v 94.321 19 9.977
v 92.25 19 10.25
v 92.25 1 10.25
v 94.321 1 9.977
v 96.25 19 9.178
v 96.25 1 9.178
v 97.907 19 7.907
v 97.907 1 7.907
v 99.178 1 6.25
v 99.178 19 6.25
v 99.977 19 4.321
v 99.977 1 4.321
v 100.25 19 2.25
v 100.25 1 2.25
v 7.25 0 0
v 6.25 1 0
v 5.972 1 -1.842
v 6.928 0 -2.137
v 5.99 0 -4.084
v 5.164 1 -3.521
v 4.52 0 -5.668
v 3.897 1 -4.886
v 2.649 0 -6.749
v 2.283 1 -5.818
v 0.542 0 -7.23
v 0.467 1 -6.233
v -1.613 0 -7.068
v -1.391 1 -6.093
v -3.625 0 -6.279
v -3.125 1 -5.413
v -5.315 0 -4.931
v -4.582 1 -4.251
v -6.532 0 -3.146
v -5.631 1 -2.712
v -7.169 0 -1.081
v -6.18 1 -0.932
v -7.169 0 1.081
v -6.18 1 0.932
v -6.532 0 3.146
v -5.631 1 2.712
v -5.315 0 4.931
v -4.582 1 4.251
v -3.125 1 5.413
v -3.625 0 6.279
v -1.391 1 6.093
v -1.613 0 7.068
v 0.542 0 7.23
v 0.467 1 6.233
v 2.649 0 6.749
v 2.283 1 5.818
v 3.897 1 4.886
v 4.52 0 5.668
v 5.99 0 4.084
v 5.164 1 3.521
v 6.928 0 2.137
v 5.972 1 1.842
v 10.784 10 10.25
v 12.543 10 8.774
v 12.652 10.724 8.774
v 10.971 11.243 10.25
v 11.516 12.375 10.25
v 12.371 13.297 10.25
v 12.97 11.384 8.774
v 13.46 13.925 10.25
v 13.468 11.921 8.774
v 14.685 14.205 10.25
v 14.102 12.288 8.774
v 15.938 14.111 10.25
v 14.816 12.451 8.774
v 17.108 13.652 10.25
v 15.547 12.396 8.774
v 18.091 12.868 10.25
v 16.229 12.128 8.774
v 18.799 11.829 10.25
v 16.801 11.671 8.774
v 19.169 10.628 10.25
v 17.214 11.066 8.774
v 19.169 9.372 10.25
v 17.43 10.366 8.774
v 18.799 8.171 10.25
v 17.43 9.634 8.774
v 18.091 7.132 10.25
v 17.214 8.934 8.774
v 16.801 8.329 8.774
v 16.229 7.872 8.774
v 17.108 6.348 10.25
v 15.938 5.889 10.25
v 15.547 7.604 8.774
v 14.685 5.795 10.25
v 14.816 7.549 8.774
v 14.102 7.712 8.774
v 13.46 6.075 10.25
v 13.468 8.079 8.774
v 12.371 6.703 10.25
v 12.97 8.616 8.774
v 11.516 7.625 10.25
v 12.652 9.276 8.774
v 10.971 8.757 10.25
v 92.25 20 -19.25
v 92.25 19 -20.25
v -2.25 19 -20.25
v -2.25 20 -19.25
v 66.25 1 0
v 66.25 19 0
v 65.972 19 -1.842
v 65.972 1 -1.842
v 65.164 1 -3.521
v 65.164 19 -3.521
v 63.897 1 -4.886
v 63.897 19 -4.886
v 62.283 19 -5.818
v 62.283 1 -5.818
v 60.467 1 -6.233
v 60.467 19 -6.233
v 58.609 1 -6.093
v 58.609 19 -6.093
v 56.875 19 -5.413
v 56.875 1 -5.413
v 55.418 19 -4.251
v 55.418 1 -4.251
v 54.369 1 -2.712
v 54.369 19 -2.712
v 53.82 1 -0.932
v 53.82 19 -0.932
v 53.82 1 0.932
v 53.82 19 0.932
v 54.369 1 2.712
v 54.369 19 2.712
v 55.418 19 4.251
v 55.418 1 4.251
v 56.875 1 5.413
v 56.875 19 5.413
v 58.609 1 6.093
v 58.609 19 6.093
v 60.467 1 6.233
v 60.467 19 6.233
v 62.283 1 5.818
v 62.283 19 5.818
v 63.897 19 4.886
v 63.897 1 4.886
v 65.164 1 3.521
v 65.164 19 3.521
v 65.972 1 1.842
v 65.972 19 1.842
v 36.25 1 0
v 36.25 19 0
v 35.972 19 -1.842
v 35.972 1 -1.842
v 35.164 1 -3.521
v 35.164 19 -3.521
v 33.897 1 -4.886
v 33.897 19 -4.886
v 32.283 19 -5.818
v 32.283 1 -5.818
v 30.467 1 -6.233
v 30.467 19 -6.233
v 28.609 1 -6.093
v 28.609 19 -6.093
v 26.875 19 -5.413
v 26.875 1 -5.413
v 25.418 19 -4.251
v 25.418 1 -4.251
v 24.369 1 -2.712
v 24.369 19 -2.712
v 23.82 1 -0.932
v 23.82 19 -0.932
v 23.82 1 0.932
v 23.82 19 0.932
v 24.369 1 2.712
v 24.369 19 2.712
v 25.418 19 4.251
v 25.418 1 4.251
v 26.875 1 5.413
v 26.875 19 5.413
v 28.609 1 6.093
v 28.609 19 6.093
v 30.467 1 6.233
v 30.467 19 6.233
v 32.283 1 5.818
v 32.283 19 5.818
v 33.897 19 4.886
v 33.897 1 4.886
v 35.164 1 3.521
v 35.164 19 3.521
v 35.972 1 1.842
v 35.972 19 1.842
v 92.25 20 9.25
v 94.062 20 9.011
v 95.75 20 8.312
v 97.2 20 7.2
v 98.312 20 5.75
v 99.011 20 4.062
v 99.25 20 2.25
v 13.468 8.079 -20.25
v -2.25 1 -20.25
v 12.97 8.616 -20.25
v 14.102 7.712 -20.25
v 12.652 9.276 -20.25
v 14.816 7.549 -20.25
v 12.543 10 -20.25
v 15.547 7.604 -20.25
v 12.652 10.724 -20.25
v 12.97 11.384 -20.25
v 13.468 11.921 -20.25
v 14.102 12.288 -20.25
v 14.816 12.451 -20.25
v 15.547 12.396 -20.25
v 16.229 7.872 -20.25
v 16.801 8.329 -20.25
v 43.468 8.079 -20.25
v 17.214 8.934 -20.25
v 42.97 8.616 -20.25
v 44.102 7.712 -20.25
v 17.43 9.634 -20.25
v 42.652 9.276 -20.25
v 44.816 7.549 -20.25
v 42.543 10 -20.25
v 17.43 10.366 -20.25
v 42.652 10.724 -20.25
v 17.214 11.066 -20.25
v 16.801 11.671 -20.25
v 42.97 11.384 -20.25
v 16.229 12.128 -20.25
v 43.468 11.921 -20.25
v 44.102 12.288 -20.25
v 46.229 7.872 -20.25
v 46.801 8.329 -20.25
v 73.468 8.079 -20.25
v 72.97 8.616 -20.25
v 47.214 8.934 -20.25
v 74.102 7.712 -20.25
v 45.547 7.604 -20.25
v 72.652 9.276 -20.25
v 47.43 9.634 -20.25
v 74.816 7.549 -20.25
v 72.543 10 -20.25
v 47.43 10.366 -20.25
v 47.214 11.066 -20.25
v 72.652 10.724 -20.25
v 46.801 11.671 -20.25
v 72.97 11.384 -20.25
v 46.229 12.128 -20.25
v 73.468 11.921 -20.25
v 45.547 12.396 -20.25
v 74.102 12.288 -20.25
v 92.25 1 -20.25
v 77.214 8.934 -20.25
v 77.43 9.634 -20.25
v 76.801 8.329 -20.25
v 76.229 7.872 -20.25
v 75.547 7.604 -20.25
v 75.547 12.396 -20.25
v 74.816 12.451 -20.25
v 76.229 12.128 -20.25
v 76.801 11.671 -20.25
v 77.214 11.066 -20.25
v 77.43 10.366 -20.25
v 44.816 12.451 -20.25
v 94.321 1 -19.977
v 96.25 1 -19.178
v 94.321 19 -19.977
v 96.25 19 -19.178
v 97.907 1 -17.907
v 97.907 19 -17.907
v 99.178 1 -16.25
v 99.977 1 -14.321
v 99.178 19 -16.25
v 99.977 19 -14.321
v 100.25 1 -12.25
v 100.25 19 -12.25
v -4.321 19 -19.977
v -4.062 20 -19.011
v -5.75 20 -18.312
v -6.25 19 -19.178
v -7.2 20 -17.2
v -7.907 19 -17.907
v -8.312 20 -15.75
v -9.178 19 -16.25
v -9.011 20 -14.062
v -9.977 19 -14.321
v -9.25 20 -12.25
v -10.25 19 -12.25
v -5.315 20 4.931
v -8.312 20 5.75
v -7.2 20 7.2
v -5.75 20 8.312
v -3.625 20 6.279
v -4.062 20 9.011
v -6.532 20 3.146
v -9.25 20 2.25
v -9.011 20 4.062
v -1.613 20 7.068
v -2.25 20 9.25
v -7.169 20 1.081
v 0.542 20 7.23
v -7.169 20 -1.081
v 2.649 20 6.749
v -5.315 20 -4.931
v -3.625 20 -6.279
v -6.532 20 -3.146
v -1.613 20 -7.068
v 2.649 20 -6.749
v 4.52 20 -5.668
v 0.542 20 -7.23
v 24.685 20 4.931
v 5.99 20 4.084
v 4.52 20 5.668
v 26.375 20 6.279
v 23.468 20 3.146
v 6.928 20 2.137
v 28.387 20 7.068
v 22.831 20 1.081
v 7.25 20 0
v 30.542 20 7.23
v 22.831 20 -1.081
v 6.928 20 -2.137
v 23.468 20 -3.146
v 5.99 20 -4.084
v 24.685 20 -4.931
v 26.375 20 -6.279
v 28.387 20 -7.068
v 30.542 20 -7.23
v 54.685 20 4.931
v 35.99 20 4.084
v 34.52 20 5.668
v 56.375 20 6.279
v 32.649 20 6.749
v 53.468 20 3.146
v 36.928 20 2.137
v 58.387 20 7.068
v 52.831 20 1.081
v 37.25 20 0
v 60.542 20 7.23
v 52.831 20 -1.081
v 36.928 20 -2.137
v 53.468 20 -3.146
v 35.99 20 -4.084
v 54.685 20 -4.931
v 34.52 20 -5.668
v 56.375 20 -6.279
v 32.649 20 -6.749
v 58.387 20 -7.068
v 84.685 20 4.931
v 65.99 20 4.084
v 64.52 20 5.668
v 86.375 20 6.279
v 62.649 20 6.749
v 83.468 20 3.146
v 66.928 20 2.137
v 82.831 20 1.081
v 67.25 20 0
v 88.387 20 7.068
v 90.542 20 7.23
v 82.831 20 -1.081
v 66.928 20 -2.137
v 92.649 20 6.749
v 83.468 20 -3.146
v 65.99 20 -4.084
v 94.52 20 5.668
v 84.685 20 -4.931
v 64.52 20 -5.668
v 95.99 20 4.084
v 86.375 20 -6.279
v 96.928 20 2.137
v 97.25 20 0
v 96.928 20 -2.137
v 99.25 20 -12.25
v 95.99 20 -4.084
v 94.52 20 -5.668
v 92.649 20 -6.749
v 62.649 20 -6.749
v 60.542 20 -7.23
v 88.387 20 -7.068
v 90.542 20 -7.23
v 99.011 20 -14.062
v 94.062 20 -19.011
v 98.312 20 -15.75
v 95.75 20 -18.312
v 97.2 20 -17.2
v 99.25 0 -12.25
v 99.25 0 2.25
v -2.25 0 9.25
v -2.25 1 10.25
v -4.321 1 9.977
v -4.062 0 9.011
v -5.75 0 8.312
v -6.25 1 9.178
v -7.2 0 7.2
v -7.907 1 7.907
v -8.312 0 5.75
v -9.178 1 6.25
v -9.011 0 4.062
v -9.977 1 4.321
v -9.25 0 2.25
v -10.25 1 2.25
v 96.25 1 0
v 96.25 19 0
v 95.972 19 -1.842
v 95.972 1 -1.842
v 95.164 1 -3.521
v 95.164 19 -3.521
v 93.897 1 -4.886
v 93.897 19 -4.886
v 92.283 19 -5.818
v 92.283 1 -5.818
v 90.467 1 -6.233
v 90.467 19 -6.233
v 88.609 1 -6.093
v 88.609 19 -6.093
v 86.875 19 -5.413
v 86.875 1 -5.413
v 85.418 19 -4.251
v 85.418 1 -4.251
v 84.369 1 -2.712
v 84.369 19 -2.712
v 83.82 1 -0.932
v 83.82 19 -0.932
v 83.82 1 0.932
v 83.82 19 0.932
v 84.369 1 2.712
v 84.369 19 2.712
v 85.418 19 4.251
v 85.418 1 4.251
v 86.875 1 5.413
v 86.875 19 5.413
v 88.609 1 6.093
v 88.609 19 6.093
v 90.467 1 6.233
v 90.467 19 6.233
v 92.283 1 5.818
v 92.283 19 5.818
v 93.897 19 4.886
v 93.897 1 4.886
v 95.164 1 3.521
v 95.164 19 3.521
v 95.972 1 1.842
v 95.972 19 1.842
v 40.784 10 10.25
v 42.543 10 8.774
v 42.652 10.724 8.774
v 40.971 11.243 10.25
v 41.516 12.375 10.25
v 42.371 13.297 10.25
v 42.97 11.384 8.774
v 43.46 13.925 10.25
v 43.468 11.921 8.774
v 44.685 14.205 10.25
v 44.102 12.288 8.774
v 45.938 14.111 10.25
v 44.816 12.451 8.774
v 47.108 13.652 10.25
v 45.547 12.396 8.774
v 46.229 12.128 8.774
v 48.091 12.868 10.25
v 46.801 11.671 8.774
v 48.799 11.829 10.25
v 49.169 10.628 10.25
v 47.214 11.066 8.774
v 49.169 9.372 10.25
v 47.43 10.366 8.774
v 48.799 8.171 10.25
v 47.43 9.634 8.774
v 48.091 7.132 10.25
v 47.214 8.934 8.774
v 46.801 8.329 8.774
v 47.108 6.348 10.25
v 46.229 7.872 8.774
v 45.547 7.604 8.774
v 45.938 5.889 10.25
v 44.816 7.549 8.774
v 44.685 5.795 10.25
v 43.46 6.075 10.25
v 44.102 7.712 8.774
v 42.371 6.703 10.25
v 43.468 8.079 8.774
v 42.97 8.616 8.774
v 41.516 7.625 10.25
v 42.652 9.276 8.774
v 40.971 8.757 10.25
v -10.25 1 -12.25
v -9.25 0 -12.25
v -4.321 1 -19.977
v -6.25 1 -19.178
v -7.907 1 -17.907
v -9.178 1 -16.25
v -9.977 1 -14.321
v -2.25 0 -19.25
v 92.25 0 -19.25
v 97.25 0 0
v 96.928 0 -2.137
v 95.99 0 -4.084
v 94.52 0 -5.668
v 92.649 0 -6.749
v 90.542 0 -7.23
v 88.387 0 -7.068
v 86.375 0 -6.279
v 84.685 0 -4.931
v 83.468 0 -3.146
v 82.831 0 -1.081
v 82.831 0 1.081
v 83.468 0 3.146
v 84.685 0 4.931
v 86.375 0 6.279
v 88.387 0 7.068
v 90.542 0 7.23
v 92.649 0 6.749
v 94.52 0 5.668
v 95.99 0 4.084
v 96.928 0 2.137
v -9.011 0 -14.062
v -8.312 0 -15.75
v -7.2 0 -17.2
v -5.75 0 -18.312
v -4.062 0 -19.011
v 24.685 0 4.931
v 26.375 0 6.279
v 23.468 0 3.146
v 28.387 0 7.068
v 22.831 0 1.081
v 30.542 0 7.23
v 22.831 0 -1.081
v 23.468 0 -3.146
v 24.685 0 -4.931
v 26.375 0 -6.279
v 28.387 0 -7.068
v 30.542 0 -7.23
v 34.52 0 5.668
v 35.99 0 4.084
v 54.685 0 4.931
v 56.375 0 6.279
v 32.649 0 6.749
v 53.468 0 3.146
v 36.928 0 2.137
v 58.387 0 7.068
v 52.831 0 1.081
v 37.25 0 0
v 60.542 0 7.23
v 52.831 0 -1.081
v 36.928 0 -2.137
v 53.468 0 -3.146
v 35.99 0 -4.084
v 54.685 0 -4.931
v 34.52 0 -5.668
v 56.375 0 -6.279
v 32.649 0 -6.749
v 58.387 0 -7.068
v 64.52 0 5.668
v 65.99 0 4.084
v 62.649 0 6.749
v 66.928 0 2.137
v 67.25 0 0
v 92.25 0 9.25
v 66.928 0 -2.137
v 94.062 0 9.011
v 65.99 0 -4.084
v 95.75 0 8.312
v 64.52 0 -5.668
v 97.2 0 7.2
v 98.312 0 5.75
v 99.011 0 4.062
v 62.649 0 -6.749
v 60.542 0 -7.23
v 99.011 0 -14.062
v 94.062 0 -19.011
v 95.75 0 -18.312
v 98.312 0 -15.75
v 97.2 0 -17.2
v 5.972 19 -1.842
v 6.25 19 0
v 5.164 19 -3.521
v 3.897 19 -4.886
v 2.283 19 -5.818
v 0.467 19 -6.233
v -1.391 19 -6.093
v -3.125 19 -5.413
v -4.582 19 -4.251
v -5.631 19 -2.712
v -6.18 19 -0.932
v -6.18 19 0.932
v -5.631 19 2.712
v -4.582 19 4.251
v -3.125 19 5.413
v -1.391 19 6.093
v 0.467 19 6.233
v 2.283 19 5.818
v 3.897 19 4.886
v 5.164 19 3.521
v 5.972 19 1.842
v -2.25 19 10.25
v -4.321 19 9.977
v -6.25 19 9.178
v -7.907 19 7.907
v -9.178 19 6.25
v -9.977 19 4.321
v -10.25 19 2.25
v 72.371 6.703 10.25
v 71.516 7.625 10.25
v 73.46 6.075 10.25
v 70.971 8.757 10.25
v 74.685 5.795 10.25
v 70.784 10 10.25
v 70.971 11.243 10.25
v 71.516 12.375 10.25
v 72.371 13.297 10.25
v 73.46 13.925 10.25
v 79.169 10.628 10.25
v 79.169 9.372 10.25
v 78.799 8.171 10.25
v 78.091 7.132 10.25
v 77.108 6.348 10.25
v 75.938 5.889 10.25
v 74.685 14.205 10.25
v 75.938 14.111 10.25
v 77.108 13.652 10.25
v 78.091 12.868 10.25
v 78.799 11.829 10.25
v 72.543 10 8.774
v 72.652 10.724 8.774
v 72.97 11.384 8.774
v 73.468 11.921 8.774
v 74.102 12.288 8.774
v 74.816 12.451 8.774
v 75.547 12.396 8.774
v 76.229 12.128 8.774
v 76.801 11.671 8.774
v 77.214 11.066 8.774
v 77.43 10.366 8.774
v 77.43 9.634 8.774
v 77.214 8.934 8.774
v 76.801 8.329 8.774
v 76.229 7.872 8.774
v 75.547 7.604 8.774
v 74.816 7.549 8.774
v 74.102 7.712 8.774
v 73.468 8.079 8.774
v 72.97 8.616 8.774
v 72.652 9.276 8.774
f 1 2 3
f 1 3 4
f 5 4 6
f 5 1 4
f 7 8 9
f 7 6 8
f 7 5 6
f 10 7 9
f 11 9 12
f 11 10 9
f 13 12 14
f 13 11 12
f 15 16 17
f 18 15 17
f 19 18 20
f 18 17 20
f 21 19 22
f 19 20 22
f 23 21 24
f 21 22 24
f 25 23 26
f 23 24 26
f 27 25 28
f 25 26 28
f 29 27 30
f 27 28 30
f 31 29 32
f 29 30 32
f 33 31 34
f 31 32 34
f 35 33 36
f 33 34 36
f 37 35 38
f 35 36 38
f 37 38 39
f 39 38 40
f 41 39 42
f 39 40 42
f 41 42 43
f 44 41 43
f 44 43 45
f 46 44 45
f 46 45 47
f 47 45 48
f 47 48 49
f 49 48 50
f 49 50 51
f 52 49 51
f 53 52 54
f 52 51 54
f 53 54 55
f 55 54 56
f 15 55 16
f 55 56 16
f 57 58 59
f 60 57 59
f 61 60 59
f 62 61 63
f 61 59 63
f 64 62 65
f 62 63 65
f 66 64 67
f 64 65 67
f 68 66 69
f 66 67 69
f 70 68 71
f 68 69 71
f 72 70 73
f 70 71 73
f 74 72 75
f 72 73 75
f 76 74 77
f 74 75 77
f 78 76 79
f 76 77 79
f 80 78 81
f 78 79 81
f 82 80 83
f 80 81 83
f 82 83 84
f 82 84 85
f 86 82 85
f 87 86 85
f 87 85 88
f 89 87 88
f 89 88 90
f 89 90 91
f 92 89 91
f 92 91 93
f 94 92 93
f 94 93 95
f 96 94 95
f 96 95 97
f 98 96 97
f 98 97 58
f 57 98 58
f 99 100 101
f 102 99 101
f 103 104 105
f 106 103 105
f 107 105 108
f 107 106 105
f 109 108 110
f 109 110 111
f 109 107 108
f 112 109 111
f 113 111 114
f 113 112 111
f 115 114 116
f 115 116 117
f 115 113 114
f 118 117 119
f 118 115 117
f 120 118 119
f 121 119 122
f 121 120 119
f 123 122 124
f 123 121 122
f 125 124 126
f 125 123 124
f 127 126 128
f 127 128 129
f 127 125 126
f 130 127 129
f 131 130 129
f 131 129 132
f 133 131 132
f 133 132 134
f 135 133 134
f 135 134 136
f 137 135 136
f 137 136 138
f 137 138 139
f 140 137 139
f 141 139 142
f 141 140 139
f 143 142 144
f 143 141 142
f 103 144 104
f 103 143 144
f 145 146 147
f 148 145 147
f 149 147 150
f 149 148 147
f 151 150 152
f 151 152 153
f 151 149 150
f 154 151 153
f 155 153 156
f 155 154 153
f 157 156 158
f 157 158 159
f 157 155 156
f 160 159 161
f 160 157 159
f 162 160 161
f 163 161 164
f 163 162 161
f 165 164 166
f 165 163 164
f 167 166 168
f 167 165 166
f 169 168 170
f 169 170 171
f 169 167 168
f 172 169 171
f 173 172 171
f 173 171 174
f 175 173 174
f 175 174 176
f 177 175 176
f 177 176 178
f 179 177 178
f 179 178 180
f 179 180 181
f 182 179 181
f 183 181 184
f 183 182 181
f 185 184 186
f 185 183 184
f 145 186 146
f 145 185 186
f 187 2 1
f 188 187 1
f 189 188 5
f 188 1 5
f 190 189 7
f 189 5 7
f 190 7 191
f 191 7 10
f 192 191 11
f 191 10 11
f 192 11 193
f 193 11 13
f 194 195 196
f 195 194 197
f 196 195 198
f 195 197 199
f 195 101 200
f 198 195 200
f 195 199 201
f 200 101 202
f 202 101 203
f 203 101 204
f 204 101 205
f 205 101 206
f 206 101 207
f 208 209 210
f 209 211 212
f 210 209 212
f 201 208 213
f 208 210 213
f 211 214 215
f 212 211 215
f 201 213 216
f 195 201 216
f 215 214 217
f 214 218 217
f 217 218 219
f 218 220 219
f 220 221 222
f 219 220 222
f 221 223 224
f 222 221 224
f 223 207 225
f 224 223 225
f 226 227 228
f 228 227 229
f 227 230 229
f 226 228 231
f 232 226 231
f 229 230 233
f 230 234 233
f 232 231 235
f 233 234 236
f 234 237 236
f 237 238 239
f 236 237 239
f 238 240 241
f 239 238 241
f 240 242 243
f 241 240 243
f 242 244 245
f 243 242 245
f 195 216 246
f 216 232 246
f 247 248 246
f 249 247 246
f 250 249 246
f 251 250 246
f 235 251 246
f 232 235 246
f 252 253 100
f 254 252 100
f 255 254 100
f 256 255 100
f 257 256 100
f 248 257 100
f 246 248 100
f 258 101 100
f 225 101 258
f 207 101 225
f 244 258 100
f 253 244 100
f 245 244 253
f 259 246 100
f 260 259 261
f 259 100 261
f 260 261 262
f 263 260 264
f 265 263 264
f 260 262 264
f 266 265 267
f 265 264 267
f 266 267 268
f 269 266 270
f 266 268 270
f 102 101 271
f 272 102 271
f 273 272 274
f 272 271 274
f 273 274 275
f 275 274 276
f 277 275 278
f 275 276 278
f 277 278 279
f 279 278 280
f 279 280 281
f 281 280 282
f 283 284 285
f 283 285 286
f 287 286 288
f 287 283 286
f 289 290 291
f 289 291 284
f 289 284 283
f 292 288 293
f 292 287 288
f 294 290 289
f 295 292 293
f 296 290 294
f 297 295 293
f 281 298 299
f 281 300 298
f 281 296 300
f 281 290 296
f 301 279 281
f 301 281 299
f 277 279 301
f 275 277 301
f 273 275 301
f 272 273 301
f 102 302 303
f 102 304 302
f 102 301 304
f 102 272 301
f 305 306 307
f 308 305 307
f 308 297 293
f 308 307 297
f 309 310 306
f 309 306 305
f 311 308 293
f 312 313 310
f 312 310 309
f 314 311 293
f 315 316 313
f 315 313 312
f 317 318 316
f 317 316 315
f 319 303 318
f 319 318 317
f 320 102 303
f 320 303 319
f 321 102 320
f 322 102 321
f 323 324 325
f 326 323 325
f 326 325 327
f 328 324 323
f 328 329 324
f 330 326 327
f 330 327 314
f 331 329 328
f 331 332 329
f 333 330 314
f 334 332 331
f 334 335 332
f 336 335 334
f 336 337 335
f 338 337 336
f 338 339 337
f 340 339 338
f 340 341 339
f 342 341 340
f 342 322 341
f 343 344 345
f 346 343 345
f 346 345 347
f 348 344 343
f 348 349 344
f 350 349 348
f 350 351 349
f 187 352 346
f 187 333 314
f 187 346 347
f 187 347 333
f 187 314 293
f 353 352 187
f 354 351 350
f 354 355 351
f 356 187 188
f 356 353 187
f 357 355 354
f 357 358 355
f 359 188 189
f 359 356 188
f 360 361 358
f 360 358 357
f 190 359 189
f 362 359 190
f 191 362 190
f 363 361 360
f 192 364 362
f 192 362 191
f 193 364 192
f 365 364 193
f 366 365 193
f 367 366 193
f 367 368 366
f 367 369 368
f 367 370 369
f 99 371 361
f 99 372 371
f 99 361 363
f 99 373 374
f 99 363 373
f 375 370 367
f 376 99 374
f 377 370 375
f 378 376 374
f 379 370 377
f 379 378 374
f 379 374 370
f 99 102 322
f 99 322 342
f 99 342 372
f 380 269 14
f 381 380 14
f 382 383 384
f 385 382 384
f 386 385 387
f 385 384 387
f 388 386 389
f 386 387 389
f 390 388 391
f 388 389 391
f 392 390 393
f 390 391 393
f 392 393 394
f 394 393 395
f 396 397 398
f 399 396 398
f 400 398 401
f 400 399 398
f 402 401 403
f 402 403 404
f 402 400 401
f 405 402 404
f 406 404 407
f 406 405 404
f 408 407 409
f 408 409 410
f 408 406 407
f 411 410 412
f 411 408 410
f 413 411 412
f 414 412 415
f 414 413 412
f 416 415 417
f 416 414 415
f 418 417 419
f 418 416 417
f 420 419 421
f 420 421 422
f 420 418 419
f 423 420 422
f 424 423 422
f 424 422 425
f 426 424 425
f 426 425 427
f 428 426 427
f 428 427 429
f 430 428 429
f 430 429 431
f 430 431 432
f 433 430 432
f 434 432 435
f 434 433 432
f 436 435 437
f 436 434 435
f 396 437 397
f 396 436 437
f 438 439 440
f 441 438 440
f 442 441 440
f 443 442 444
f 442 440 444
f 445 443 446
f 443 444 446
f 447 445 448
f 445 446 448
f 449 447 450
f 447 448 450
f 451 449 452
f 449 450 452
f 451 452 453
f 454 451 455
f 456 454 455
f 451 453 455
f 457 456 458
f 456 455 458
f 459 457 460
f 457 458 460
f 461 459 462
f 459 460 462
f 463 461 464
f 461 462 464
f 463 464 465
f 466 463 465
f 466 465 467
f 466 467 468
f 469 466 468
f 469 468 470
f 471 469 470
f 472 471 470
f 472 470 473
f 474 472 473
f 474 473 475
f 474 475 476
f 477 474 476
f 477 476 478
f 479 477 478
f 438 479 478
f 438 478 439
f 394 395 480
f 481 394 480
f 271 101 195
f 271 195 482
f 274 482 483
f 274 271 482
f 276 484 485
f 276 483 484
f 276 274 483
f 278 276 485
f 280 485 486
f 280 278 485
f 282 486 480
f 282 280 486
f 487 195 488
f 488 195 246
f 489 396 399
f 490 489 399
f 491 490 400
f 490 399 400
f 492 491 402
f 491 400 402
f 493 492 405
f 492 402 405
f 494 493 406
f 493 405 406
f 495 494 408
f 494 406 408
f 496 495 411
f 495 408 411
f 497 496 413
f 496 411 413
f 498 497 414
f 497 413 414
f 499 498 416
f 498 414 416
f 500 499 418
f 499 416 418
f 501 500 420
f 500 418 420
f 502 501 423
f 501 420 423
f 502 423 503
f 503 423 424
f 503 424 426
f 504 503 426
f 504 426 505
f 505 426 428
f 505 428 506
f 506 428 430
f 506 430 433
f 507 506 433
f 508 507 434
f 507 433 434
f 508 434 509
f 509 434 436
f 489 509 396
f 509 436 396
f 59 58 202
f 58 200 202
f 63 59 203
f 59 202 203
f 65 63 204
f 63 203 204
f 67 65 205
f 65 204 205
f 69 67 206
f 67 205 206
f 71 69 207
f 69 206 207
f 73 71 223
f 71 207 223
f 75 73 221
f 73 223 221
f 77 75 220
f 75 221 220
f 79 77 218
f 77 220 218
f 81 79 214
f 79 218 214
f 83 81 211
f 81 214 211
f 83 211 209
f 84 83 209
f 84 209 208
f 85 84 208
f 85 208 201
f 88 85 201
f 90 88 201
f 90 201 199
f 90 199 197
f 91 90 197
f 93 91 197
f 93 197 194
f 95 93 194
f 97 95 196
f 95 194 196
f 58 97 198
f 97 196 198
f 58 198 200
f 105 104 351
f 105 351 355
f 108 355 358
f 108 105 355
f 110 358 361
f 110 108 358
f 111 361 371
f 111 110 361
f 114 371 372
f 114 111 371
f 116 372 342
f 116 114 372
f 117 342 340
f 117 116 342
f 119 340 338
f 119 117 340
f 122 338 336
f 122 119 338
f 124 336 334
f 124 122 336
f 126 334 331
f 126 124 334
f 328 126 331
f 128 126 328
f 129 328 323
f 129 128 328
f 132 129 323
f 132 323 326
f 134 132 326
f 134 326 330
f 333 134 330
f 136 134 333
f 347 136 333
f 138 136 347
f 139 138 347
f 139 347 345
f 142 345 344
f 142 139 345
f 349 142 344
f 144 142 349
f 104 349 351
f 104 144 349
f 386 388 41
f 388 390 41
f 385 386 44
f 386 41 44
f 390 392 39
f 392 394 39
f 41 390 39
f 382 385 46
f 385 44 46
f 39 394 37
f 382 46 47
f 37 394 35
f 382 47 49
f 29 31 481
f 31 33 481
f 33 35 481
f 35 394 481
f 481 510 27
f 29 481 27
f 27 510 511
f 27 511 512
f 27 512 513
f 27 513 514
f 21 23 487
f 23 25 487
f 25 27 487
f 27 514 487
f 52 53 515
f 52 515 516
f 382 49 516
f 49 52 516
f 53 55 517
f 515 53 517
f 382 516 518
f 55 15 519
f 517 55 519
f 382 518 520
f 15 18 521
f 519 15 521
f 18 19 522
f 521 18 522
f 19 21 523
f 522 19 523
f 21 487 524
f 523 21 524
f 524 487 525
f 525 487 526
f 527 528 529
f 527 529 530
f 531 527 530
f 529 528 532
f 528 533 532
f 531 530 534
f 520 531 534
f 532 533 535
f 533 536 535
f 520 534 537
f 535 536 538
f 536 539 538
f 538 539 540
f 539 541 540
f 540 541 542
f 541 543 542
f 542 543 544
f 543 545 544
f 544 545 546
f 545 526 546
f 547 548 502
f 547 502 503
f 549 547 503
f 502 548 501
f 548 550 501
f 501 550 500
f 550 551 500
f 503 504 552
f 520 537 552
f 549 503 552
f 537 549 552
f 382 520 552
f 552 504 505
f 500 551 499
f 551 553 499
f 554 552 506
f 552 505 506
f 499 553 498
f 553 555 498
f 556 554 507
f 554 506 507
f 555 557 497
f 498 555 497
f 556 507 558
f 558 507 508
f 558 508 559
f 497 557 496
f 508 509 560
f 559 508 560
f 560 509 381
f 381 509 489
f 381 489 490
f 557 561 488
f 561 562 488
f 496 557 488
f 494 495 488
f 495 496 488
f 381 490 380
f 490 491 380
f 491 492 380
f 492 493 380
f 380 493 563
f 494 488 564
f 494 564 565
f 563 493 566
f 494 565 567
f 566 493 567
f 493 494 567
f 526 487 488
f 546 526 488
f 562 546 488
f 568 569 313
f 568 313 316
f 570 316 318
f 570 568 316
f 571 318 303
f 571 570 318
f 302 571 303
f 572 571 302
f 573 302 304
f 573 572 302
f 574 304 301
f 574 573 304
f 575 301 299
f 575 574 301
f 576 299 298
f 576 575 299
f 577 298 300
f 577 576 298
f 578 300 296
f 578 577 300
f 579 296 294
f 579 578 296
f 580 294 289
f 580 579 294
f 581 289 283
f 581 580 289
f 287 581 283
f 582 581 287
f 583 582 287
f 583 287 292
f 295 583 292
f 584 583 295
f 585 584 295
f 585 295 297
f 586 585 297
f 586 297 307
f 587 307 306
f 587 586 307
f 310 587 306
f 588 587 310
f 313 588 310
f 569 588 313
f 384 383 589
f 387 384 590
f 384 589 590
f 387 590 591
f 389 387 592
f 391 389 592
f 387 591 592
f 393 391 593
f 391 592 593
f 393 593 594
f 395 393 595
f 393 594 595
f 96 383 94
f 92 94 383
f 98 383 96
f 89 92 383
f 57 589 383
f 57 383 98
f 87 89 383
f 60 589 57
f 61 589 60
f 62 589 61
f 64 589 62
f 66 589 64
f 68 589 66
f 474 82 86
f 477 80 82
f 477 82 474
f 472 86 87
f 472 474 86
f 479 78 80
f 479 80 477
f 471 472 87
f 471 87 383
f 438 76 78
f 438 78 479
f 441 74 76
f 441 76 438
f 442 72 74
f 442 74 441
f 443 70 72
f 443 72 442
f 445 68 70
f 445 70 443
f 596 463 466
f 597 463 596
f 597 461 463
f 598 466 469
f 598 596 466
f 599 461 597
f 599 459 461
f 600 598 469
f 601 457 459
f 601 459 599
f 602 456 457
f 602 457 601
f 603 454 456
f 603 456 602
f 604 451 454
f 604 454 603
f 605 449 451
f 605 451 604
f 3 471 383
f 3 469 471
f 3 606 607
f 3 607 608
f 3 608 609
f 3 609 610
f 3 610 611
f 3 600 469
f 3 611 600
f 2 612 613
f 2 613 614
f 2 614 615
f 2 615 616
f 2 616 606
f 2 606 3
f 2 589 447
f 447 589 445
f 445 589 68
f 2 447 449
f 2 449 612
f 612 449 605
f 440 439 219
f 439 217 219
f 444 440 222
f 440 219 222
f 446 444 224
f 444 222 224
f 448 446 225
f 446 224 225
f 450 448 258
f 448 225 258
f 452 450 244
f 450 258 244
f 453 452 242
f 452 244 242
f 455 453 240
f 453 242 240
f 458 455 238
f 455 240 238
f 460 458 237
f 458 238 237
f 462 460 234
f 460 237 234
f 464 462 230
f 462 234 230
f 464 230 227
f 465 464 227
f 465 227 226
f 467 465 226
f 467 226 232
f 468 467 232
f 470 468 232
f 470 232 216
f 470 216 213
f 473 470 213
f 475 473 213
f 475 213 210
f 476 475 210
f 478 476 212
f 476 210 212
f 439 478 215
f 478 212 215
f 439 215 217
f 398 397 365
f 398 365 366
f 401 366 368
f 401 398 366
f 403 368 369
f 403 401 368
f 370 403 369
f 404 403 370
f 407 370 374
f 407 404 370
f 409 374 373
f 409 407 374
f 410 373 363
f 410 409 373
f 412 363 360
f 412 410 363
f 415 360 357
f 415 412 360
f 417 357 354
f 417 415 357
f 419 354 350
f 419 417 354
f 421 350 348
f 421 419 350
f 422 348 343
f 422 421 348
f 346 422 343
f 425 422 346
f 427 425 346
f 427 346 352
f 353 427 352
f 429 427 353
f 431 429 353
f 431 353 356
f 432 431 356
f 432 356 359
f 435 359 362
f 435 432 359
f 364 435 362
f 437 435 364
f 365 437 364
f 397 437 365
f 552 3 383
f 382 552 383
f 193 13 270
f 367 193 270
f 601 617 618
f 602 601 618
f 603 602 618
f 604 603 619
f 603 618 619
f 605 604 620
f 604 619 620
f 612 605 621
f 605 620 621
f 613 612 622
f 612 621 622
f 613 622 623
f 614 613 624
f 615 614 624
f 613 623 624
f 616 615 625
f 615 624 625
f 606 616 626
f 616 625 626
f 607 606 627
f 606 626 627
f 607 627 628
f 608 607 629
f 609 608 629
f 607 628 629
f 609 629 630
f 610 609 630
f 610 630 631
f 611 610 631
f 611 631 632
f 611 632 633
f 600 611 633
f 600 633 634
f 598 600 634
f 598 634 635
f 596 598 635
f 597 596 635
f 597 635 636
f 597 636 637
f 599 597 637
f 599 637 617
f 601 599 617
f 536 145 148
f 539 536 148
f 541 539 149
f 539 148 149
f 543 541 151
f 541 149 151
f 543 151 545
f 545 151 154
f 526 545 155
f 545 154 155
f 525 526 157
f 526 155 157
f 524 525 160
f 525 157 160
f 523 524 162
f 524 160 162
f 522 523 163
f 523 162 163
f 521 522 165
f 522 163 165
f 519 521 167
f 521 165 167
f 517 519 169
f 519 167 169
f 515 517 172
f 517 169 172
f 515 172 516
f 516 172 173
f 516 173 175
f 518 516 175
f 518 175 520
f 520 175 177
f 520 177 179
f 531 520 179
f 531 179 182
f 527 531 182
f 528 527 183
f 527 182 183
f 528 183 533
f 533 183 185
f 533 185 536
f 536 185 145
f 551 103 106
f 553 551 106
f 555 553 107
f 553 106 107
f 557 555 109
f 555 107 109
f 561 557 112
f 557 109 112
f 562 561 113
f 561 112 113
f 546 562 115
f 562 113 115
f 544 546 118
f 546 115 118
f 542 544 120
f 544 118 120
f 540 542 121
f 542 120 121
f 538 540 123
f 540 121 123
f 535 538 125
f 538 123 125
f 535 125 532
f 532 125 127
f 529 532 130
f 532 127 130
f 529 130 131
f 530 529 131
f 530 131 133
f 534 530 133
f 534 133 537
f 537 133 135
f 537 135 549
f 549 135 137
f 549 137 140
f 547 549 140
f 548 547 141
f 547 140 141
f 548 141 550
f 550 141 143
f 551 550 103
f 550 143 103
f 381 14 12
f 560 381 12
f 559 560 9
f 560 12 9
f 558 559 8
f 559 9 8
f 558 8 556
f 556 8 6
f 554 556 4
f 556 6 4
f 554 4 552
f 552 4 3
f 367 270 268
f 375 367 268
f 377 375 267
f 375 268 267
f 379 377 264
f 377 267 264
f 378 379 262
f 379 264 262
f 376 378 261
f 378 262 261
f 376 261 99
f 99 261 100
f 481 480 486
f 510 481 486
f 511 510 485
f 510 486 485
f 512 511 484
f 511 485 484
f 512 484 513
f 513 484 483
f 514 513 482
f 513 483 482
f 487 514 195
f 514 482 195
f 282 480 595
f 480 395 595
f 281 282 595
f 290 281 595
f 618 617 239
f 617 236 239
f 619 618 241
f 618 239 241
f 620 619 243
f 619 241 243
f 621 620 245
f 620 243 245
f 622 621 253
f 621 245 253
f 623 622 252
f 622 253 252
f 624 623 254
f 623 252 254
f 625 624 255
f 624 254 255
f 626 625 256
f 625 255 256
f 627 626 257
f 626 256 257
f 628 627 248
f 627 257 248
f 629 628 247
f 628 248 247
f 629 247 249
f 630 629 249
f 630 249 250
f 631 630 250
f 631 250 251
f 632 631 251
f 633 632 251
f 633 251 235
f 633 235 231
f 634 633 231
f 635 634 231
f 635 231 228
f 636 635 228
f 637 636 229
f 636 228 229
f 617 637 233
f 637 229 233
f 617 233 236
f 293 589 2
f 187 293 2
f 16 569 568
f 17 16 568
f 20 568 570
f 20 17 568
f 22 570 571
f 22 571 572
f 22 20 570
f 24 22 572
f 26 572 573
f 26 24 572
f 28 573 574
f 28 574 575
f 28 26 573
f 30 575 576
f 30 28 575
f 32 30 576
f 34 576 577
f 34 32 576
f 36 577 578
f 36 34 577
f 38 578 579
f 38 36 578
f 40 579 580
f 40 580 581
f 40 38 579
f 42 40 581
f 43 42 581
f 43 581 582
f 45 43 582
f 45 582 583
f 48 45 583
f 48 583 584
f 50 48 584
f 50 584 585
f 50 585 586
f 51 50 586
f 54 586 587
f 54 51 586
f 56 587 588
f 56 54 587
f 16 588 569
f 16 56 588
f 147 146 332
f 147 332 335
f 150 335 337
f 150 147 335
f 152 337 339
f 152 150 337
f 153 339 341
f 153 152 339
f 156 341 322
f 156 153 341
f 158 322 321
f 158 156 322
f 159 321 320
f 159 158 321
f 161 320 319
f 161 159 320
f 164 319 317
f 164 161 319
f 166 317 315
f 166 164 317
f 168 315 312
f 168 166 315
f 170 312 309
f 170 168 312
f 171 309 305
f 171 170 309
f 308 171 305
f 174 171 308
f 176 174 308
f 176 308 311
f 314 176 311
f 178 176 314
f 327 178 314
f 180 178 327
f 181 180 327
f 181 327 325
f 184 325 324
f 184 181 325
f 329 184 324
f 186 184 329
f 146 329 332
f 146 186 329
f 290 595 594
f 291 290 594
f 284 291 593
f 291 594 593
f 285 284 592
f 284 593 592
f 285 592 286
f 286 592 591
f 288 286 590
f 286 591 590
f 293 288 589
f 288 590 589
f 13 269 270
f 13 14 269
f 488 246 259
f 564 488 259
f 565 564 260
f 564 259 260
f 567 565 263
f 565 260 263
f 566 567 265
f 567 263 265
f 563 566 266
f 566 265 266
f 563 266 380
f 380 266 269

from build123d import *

# Parameters (mm, degrees)
SKETCH1_W                                         = 20.5
SKETCH1_H                                         = 20.5
SKETCH1_R                                         = 6.25
BOSS_EXTRUDE1_DEPTH                               = 20
SKETCH2_W                                         = 20.5
SKETCH2_H                                         = 20
BOSS_EXTRUDE2_DEPTH                               = 10
LPATTERN1_COUNT                                   = 4
LPATTERN1_PITCH                                   = 30
SKETCH3_W                                         = 9.5
SKETCH3_H                                         = 30.5
BOSS_EXTRUDE3_DEPTH                               = 20
CSK_FOR_8_FLAT_HEAD_MACHINE_SCREW_100_D           = 4.9149
CSK_FOR_8_FLAT_HEAD_MACHINE_SCREW_100_CSINK_D     = 8.4328
CSK_FOR_8_FLAT_HEAD_MACHINE_SCREW_100_CSINK_ANGLE = 100
FILLET1_R                                         = 8
CHAMFER1_SIZE                                     = 1


with BuildPart() as part:
    # Sketch1 → Boss-Extrude1 (new body)
    with BuildSketch(Plane(origin=(0, 0, 0), x_dir=(1, 0, 0), z_dir=(0, 1, 0))):
        Rectangle(SKETCH1_W, SKETCH1_H)
        Circle(SKETCH1_R, mode=Mode.SUBTRACT)
    extrude(amount=BOSS_EXTRUDE1_DEPTH)

    # Sketch2 → Boss-Extrude2 (add)
    with BuildSketch(Plane(origin=(0, 0, -10.25), x_dir=(-1, 0, 0), z_dir=(0, 0, -1))):
        with Locations((0, 10)):
            Rectangle(SKETCH2_W, SKETCH2_H)
    extrude(amount=BOSS_EXTRUDE2_DEPTH)


with BuildPart() as lpattern1_1:
    # LPattern1: pattern copy
    add(part.part.moved(Location(Vector(1, 0, 0) * (1 * LPATTERN1_PITCH))))


with BuildPart() as lpattern1_2:
    # LPattern1: pattern copy
    add(part.part.moved(Location(Vector(1, 0, 0) * (2 * LPATTERN1_PITCH))))


with BuildPart() as lpattern1_3:
    # LPattern1: pattern copy
    add(part.part.moved(Location(Vector(1, 0, 0) * (3 * LPATTERN1_PITCH))))


with BuildPart() as part_1:
    add(part.part)

    add(lpattern1_1.part)  # Boss-Extrude3 merges LPattern1_1

    add(lpattern1_2.part)  # Boss-Extrude3 merges LPattern1_2

    add(lpattern1_3.part)  # Boss-Extrude3 merges LPattern1_3
    # Sketch3 → Boss-Extrude3 (add)
    with BuildSketch(Plane(origin=(0, 20, 0), x_dir=(1, 0, 0), z_dir=(0, 1, 0))):
        with Locations((15, 5)):
            Rectangle(SKETCH3_W, SKETCH3_H)
        with Locations((45, 5)):
            Rectangle(SKETCH3_W, SKETCH3_H)
        with Locations((75, 5)):
            Rectangle(SKETCH3_W, SKETCH3_H)
    extrude(amount=-BOSS_EXTRUDE3_DEPTH)

    # CSK for #8 Flat Head Machine Screw (100)1 (through all)
    with Locations(Plane(origin=(15, 10, 10.25), x_dir=(1, 0, 0), z_dir=(0, 0, 1))):
        with Locations((0, 0), (30, 0), (60, 0)):
            CounterSinkHole(CSK_FOR_8_FLAT_HEAD_MACHINE_SCREW_100_D / 2, CSK_FOR_8_FLAT_HEAD_MACHINE_SCREW_100_CSINK_D / 2, counter_sink_angle=CSK_FOR_8_FLAT_HEAD_MACHINE_SCREW_100_CSINK_ANGLE)

    # Fillet1
    fillet1_edges = [part_1.edges().sort_by_distance(p)[0] for p in [
        (-10.25, 10, -20.25),
        (-10.25, 10, 10.25),
        (100.25, 10, 10.25),
        (100.25, 10, -20.25),
    ]]
    fillet(fillet1_edges, radius=FILLET1_R)

    # Chamfer1
    chamfer1_edges = [part_1.edges().sort_by_distance(p)[0] for p in [
        (45, 20, -20.25),
        (45, 0, -20.25),
        (45, 20, 10.25),
        (100.25, 20, -5),
        (-10.25, 20, -5),
        (-7.906854249, 20, 7.906854249),
        (97.906854249, 20, 7.906854249),
        (97.906854249, 20, -17.906854249),
        (-7.906854249, 20, -17.906854249),
        (-10.25, 0, -5),
        (-6.25, 0, 0),
        (100.25, 0, -5),
        (45, 0, 10.25),
        (-7.906854249, 0, 7.906854249),
        (-6.25, 20, 0),
        (97.906854249, 0, 7.906854249),
        (97.906854249, 0, -17.906854249),
        (-7.906854249, 0, -17.906854249),
        (23.75, 0, 0),
        (23.75, 20, 0),
        (53.75, 0, 0),
        (53.75, 20, 0),
        (83.75, 0, 0),
        (83.75, 20, 0),
    ]]
    chamfer(chamfer1_edges, length=CHAMFER1_SIZE)


solid = part_1.part
